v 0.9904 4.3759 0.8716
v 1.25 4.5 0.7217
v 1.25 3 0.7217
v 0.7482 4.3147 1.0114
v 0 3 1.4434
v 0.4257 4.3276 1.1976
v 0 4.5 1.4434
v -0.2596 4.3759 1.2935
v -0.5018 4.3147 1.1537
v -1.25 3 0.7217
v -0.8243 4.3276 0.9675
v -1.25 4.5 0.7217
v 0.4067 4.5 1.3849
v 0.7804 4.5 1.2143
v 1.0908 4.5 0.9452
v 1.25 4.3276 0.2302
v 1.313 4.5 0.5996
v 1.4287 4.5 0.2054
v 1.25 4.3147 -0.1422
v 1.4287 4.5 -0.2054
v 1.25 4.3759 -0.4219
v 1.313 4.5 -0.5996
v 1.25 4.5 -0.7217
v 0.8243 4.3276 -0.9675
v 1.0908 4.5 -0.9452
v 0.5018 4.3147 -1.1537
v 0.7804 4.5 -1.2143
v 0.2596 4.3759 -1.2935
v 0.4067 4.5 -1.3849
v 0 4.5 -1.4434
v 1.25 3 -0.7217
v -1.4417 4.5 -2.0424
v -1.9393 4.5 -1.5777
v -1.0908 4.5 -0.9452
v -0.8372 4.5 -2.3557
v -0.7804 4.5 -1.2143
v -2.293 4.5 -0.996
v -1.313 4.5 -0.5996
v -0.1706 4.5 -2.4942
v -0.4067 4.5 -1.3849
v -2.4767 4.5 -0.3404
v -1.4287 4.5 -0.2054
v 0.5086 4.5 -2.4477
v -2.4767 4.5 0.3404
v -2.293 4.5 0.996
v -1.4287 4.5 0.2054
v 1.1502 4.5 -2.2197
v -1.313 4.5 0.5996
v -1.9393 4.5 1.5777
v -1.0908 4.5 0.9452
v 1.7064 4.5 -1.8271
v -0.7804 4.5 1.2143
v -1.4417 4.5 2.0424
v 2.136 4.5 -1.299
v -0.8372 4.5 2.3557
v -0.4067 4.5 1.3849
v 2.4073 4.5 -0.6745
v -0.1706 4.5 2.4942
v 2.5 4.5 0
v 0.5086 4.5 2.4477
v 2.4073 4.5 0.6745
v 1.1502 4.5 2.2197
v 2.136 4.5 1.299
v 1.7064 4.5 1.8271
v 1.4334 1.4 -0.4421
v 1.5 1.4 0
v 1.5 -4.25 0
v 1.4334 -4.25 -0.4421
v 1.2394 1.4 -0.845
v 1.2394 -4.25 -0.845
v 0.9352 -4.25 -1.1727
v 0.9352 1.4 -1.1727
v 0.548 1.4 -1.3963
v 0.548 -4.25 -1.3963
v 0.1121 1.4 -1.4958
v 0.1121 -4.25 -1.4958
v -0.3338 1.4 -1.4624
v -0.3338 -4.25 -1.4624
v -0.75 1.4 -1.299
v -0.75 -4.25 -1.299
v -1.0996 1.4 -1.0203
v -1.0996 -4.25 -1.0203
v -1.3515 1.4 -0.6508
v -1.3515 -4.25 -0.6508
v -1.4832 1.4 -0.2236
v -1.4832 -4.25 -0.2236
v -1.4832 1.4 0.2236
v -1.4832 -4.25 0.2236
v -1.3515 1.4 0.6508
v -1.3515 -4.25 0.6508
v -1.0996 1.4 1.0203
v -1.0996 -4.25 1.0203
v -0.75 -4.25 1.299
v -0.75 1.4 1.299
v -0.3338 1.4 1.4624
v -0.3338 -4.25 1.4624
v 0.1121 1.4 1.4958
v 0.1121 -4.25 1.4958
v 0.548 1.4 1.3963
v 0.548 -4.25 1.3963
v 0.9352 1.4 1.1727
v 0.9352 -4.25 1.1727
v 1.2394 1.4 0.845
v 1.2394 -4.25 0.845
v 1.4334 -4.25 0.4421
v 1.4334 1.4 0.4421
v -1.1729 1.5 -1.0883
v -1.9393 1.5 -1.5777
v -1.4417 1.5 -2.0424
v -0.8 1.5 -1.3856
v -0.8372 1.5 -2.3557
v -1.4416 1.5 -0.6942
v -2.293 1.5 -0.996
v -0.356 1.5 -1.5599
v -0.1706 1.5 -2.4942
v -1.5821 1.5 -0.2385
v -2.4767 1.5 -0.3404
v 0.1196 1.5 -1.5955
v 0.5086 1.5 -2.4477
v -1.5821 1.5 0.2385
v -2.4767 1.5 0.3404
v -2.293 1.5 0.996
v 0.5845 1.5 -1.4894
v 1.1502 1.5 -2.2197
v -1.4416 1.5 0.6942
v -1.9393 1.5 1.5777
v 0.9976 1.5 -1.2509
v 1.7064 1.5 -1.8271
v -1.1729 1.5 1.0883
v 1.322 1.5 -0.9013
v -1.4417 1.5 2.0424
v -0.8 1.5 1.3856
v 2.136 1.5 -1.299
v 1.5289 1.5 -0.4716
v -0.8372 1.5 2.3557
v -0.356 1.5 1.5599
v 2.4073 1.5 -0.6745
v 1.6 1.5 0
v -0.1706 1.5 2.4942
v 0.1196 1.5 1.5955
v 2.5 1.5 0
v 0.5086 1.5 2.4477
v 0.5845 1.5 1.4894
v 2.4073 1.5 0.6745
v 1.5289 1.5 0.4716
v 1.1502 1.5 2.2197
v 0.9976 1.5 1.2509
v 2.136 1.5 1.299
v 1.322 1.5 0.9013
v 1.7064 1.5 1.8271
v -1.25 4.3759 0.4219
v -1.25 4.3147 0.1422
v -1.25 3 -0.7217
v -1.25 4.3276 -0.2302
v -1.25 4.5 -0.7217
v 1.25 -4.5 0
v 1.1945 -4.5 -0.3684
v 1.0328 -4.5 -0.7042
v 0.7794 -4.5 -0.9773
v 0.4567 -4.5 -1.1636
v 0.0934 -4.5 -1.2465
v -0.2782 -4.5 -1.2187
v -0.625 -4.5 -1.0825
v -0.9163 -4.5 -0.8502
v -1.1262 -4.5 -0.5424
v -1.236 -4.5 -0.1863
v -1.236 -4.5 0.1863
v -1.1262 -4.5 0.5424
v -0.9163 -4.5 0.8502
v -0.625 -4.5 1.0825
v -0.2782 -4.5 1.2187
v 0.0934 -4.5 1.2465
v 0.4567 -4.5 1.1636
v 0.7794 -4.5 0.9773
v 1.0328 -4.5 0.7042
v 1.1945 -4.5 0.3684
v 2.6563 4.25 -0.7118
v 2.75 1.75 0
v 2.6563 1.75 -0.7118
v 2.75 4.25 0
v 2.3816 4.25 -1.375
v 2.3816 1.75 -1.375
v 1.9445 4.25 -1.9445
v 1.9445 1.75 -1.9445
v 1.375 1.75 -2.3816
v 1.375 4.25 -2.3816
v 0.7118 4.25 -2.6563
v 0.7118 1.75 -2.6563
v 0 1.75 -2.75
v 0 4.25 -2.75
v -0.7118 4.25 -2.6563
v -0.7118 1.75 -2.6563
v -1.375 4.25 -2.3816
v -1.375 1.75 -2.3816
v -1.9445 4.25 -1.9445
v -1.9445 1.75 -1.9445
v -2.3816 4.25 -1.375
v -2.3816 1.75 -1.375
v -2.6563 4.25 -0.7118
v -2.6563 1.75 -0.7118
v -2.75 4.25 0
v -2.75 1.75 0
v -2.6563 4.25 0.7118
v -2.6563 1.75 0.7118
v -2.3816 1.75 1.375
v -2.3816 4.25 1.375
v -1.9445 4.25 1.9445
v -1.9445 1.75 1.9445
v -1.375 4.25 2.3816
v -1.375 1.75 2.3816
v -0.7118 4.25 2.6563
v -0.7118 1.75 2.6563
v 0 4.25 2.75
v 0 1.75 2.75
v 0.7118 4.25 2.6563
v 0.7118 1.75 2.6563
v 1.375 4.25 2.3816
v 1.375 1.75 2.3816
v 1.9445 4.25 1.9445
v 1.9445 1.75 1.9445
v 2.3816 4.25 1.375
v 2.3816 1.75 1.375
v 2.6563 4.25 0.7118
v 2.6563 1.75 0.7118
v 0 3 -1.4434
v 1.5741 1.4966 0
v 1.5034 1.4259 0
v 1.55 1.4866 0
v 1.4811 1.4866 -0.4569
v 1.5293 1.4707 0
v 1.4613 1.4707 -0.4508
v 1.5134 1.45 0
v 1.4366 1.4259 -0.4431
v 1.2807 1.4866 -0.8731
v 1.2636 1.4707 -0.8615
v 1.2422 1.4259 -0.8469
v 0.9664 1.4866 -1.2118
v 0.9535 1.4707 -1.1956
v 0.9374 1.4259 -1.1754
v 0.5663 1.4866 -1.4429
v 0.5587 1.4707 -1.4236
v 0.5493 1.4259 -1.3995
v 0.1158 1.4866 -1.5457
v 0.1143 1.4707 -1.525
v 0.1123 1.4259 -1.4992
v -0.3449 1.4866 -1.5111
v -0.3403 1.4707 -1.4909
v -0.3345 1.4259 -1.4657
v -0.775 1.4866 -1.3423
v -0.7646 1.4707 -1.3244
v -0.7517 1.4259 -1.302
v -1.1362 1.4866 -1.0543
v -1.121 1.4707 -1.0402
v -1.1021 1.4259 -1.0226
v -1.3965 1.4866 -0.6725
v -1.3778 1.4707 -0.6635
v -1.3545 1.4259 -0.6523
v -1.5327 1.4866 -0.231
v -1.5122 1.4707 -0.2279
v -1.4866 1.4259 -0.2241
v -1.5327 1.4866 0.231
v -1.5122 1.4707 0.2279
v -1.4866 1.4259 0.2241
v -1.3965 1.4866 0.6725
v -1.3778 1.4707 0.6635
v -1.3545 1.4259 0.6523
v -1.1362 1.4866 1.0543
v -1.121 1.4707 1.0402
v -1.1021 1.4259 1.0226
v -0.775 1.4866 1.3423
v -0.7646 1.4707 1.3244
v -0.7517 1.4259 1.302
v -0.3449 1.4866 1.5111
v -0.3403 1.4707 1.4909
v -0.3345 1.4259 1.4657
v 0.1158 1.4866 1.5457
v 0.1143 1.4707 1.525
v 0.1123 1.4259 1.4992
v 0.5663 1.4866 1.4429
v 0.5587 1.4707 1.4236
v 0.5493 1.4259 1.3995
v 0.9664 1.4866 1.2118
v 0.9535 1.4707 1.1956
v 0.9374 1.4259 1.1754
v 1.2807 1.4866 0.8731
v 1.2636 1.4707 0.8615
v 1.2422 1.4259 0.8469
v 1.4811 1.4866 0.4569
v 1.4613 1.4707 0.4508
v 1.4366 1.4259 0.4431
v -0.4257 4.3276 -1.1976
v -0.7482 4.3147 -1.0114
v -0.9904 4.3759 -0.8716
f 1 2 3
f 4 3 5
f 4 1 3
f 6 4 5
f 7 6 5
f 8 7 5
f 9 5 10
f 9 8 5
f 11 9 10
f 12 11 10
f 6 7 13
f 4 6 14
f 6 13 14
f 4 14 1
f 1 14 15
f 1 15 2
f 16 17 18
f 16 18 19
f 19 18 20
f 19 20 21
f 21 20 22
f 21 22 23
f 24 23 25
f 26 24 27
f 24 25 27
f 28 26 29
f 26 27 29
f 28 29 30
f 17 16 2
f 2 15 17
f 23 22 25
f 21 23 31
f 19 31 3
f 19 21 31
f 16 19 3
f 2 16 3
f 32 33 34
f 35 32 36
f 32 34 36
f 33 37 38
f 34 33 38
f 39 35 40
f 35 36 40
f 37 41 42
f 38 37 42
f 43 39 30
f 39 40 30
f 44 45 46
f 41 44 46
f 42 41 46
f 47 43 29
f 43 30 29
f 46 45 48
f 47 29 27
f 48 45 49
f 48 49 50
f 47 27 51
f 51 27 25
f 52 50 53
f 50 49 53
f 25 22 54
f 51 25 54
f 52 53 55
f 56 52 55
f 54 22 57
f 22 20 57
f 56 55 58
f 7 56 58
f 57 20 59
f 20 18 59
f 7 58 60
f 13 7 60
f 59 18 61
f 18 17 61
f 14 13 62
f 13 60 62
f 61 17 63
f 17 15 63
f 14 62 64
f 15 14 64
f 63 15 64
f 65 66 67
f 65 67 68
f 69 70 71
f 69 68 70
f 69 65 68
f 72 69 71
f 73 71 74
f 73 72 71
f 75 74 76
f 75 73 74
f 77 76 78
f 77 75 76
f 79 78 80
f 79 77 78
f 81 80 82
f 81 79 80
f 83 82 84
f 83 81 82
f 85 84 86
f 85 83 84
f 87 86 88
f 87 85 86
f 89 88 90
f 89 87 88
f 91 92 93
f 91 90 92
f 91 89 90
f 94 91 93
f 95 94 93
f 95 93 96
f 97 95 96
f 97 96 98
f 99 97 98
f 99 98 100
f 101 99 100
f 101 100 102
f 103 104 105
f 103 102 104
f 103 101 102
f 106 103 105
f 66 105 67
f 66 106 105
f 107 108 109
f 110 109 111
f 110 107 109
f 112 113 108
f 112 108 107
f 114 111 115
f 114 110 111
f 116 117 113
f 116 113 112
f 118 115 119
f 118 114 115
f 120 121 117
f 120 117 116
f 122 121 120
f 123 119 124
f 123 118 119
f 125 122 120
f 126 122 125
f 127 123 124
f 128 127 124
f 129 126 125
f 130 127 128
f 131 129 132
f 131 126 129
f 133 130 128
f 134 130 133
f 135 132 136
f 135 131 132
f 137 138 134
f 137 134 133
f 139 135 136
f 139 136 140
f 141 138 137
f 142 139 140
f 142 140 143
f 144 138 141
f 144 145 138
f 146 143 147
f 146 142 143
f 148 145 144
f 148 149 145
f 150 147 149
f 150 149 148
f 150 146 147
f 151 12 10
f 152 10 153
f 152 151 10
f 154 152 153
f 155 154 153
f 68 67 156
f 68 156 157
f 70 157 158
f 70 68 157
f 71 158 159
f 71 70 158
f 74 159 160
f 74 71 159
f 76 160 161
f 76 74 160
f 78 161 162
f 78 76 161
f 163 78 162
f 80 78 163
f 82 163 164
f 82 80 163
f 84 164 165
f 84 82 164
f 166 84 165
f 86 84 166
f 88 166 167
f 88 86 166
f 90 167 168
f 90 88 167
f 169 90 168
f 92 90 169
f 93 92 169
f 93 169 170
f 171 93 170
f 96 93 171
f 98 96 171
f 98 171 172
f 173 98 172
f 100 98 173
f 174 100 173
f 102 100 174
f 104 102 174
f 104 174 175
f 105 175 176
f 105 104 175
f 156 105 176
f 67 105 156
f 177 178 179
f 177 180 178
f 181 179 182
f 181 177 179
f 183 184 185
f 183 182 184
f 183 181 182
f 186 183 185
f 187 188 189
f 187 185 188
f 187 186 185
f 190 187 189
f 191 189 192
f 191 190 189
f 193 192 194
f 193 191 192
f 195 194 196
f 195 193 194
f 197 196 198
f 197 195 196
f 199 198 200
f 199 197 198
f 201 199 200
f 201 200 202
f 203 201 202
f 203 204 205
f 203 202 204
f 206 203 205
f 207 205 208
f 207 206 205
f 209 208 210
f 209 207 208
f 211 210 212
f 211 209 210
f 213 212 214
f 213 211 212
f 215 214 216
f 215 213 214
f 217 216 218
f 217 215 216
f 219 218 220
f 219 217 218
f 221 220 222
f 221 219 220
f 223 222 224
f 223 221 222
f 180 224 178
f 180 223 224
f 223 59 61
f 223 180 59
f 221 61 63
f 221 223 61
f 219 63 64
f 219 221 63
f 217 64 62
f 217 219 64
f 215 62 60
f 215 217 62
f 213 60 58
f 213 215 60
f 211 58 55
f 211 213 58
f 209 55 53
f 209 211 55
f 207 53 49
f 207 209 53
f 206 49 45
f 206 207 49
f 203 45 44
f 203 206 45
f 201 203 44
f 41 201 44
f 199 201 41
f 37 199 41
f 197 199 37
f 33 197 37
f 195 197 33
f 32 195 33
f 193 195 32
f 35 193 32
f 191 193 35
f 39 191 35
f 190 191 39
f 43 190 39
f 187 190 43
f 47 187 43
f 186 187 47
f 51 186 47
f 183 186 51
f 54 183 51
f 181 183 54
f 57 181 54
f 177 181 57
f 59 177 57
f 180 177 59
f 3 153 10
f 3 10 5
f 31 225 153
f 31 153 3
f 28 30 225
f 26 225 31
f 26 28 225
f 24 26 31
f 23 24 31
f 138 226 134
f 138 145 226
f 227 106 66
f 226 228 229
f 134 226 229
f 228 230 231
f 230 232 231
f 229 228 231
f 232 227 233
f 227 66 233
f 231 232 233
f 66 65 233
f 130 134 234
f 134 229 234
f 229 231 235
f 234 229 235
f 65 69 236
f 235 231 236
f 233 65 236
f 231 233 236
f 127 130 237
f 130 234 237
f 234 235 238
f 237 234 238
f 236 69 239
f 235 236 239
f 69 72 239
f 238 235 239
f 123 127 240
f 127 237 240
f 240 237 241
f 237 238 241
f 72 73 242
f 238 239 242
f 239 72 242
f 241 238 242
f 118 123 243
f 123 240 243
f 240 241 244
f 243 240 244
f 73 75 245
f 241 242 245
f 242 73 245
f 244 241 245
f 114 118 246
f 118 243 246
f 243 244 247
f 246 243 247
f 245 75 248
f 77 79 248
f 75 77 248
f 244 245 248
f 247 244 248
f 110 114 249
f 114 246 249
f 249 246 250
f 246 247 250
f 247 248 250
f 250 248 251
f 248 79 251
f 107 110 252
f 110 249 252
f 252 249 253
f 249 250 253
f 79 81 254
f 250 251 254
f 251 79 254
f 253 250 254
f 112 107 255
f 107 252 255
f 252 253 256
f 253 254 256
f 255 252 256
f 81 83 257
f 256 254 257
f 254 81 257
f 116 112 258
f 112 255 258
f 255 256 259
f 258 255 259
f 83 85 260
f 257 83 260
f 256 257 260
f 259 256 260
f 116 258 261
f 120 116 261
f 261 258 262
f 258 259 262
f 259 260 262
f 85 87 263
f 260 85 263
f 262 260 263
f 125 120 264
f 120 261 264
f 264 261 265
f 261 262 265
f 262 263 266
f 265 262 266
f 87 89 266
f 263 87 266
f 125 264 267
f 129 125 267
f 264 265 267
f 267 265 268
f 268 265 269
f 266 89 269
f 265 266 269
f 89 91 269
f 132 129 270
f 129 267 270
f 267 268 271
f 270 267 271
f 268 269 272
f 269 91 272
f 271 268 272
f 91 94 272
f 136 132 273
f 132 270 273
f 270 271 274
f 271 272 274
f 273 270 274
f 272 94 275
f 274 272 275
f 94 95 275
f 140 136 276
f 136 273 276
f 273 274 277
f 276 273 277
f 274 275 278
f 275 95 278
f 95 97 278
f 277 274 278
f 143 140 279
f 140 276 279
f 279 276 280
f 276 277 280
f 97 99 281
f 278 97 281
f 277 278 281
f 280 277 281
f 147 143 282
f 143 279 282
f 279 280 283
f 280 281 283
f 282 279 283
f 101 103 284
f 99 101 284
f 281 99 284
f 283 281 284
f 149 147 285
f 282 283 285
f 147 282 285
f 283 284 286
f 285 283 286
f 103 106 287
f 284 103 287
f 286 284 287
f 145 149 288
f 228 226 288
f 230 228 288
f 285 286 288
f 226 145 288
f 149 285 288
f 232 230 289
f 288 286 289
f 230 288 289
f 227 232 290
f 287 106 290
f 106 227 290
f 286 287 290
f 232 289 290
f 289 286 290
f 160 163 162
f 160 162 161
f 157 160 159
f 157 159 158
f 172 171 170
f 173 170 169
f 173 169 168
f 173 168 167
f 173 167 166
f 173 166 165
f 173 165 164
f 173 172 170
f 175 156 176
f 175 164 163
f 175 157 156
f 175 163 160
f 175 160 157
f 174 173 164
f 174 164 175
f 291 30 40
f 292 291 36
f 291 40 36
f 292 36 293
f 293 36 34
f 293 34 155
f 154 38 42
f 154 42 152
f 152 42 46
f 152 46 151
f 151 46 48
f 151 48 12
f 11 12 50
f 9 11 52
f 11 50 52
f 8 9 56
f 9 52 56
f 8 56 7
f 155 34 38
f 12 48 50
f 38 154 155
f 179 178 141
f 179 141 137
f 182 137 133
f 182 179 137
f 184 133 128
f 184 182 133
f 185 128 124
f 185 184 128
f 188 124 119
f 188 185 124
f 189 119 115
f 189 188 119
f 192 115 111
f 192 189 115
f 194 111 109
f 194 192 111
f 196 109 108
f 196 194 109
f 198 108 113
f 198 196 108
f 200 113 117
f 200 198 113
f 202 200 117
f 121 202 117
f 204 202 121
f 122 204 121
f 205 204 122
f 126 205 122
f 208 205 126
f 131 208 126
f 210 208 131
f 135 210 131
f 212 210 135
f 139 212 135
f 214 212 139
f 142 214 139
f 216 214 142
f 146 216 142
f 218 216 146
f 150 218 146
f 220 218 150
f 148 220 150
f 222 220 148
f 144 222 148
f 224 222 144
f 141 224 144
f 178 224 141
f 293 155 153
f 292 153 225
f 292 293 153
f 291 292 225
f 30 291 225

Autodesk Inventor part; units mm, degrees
ref_plane "YZ Plane" through (0, 0, 0) normal (1, 0, 0) x (0, 1, 0)
ref_plane "XZ Plane" through (0, 0, 0) normal (0, 1, 0) x (-1, 0, 0)
ref_plane "XY Plane" through (0, 0, 0) normal (0, 0, 1) x (1, 0, 0)
sketch "Sketch1" plane through (0, 0, 0) normal (0, 0, 1) x (1, 0, 0)
  line L0 (0, 4.5) -> (0, -4.5)
  line L1 (0, -4.5) -> (1.25, -4.5)
  line L2 (1.25, -4.5) -> (1.5, -4.25)
  line L3 (1.5, -4.25) -> (1.5, 1.4)
  line L4 (1.6, 1.5) -> (2.5, 1.5)
  line L5 (2.75, 1.75) -> (2.75, 4.25)
  line L6 (2.5, 4.5) -> (0, 4.5)
  arc A0 (1.6, 1.5) -> (1.5, 1.4) centre (1.6, 1.4) ccw
  line L7 (2.5, 4.5) -> (2.75, 4.25)
  line L8 (2.5, 1.5) -> (2.75, 1.75)
  point P0 (0, 0)
  point P1 (2.75, 1.5)
  point P2 (2.75, 4.5)
  point P3 (0, 0)
  dimension "d0" = 5.5
  dimension "d1" = 3
  dimension "d3" = 3
  dimension "d4" = 3.2
  dimension "d5" = 135
  dimension "d6" = 0.25
  dimension "d7" = 6
  dimension "d18" = 0.25
revolve "Revolution1" add sketch "Sketch1" angle 360 about axis through (0, 4.5, 0) along (0, -1, 0)
sketch "Sketch2" plane through (0, 4.5, 0) normal (0, 1, 0) x (1, 0, 0)
  line L0 (0, -1.4434) -> (-1.25, -0.7217)
  line L1 (-1.25, -0.7217) -> (-1.25, 0.7217)
  line L2 (-1.25, 0.7217) -> (0, 1.4434)
  line L3 (0, 1.4434) -> (1.25, 0.7217)
  line L4 (1.25, 0.7217) -> (1.25, -0.7217)
  line L5 (1.25, -0.7217) -> (0, -1.4434)
  point P0 (0, 0)
  point P1 (0, 0)
  dimension "d11" = 2.5
extrude "Extrusion1" cut sketch "Sketch2" against normal blind 1.5
thread "Thread1"
sketch "Sketch3" plane through (0, 0, 0) normal (1, 0, 0) x (0, 1, 0)
  line L0 (4.5, 1.4434) -> (4.5, 0.7217)
  line L1 (4.5, 1.4434) -> (4, 0.9434)
  line L2 (4, 0.9434) -> (4.5, 0.9434)
  line L3 (4.5, 0.9434) -> (4.5, 1.4434)
  line L4 (-0.8, 0) -> (4.8, 0)
  point P0 (0, 0)
  dimension "d16" = 0.5
revolve "Revolution2" cut sketch "Sketch3" angle 360 about axis through (0, -10, 0) along (0, 1, 0)
properties part number "Bolt_M3x0.35_6mm_SH" material "Stainless Steel"
